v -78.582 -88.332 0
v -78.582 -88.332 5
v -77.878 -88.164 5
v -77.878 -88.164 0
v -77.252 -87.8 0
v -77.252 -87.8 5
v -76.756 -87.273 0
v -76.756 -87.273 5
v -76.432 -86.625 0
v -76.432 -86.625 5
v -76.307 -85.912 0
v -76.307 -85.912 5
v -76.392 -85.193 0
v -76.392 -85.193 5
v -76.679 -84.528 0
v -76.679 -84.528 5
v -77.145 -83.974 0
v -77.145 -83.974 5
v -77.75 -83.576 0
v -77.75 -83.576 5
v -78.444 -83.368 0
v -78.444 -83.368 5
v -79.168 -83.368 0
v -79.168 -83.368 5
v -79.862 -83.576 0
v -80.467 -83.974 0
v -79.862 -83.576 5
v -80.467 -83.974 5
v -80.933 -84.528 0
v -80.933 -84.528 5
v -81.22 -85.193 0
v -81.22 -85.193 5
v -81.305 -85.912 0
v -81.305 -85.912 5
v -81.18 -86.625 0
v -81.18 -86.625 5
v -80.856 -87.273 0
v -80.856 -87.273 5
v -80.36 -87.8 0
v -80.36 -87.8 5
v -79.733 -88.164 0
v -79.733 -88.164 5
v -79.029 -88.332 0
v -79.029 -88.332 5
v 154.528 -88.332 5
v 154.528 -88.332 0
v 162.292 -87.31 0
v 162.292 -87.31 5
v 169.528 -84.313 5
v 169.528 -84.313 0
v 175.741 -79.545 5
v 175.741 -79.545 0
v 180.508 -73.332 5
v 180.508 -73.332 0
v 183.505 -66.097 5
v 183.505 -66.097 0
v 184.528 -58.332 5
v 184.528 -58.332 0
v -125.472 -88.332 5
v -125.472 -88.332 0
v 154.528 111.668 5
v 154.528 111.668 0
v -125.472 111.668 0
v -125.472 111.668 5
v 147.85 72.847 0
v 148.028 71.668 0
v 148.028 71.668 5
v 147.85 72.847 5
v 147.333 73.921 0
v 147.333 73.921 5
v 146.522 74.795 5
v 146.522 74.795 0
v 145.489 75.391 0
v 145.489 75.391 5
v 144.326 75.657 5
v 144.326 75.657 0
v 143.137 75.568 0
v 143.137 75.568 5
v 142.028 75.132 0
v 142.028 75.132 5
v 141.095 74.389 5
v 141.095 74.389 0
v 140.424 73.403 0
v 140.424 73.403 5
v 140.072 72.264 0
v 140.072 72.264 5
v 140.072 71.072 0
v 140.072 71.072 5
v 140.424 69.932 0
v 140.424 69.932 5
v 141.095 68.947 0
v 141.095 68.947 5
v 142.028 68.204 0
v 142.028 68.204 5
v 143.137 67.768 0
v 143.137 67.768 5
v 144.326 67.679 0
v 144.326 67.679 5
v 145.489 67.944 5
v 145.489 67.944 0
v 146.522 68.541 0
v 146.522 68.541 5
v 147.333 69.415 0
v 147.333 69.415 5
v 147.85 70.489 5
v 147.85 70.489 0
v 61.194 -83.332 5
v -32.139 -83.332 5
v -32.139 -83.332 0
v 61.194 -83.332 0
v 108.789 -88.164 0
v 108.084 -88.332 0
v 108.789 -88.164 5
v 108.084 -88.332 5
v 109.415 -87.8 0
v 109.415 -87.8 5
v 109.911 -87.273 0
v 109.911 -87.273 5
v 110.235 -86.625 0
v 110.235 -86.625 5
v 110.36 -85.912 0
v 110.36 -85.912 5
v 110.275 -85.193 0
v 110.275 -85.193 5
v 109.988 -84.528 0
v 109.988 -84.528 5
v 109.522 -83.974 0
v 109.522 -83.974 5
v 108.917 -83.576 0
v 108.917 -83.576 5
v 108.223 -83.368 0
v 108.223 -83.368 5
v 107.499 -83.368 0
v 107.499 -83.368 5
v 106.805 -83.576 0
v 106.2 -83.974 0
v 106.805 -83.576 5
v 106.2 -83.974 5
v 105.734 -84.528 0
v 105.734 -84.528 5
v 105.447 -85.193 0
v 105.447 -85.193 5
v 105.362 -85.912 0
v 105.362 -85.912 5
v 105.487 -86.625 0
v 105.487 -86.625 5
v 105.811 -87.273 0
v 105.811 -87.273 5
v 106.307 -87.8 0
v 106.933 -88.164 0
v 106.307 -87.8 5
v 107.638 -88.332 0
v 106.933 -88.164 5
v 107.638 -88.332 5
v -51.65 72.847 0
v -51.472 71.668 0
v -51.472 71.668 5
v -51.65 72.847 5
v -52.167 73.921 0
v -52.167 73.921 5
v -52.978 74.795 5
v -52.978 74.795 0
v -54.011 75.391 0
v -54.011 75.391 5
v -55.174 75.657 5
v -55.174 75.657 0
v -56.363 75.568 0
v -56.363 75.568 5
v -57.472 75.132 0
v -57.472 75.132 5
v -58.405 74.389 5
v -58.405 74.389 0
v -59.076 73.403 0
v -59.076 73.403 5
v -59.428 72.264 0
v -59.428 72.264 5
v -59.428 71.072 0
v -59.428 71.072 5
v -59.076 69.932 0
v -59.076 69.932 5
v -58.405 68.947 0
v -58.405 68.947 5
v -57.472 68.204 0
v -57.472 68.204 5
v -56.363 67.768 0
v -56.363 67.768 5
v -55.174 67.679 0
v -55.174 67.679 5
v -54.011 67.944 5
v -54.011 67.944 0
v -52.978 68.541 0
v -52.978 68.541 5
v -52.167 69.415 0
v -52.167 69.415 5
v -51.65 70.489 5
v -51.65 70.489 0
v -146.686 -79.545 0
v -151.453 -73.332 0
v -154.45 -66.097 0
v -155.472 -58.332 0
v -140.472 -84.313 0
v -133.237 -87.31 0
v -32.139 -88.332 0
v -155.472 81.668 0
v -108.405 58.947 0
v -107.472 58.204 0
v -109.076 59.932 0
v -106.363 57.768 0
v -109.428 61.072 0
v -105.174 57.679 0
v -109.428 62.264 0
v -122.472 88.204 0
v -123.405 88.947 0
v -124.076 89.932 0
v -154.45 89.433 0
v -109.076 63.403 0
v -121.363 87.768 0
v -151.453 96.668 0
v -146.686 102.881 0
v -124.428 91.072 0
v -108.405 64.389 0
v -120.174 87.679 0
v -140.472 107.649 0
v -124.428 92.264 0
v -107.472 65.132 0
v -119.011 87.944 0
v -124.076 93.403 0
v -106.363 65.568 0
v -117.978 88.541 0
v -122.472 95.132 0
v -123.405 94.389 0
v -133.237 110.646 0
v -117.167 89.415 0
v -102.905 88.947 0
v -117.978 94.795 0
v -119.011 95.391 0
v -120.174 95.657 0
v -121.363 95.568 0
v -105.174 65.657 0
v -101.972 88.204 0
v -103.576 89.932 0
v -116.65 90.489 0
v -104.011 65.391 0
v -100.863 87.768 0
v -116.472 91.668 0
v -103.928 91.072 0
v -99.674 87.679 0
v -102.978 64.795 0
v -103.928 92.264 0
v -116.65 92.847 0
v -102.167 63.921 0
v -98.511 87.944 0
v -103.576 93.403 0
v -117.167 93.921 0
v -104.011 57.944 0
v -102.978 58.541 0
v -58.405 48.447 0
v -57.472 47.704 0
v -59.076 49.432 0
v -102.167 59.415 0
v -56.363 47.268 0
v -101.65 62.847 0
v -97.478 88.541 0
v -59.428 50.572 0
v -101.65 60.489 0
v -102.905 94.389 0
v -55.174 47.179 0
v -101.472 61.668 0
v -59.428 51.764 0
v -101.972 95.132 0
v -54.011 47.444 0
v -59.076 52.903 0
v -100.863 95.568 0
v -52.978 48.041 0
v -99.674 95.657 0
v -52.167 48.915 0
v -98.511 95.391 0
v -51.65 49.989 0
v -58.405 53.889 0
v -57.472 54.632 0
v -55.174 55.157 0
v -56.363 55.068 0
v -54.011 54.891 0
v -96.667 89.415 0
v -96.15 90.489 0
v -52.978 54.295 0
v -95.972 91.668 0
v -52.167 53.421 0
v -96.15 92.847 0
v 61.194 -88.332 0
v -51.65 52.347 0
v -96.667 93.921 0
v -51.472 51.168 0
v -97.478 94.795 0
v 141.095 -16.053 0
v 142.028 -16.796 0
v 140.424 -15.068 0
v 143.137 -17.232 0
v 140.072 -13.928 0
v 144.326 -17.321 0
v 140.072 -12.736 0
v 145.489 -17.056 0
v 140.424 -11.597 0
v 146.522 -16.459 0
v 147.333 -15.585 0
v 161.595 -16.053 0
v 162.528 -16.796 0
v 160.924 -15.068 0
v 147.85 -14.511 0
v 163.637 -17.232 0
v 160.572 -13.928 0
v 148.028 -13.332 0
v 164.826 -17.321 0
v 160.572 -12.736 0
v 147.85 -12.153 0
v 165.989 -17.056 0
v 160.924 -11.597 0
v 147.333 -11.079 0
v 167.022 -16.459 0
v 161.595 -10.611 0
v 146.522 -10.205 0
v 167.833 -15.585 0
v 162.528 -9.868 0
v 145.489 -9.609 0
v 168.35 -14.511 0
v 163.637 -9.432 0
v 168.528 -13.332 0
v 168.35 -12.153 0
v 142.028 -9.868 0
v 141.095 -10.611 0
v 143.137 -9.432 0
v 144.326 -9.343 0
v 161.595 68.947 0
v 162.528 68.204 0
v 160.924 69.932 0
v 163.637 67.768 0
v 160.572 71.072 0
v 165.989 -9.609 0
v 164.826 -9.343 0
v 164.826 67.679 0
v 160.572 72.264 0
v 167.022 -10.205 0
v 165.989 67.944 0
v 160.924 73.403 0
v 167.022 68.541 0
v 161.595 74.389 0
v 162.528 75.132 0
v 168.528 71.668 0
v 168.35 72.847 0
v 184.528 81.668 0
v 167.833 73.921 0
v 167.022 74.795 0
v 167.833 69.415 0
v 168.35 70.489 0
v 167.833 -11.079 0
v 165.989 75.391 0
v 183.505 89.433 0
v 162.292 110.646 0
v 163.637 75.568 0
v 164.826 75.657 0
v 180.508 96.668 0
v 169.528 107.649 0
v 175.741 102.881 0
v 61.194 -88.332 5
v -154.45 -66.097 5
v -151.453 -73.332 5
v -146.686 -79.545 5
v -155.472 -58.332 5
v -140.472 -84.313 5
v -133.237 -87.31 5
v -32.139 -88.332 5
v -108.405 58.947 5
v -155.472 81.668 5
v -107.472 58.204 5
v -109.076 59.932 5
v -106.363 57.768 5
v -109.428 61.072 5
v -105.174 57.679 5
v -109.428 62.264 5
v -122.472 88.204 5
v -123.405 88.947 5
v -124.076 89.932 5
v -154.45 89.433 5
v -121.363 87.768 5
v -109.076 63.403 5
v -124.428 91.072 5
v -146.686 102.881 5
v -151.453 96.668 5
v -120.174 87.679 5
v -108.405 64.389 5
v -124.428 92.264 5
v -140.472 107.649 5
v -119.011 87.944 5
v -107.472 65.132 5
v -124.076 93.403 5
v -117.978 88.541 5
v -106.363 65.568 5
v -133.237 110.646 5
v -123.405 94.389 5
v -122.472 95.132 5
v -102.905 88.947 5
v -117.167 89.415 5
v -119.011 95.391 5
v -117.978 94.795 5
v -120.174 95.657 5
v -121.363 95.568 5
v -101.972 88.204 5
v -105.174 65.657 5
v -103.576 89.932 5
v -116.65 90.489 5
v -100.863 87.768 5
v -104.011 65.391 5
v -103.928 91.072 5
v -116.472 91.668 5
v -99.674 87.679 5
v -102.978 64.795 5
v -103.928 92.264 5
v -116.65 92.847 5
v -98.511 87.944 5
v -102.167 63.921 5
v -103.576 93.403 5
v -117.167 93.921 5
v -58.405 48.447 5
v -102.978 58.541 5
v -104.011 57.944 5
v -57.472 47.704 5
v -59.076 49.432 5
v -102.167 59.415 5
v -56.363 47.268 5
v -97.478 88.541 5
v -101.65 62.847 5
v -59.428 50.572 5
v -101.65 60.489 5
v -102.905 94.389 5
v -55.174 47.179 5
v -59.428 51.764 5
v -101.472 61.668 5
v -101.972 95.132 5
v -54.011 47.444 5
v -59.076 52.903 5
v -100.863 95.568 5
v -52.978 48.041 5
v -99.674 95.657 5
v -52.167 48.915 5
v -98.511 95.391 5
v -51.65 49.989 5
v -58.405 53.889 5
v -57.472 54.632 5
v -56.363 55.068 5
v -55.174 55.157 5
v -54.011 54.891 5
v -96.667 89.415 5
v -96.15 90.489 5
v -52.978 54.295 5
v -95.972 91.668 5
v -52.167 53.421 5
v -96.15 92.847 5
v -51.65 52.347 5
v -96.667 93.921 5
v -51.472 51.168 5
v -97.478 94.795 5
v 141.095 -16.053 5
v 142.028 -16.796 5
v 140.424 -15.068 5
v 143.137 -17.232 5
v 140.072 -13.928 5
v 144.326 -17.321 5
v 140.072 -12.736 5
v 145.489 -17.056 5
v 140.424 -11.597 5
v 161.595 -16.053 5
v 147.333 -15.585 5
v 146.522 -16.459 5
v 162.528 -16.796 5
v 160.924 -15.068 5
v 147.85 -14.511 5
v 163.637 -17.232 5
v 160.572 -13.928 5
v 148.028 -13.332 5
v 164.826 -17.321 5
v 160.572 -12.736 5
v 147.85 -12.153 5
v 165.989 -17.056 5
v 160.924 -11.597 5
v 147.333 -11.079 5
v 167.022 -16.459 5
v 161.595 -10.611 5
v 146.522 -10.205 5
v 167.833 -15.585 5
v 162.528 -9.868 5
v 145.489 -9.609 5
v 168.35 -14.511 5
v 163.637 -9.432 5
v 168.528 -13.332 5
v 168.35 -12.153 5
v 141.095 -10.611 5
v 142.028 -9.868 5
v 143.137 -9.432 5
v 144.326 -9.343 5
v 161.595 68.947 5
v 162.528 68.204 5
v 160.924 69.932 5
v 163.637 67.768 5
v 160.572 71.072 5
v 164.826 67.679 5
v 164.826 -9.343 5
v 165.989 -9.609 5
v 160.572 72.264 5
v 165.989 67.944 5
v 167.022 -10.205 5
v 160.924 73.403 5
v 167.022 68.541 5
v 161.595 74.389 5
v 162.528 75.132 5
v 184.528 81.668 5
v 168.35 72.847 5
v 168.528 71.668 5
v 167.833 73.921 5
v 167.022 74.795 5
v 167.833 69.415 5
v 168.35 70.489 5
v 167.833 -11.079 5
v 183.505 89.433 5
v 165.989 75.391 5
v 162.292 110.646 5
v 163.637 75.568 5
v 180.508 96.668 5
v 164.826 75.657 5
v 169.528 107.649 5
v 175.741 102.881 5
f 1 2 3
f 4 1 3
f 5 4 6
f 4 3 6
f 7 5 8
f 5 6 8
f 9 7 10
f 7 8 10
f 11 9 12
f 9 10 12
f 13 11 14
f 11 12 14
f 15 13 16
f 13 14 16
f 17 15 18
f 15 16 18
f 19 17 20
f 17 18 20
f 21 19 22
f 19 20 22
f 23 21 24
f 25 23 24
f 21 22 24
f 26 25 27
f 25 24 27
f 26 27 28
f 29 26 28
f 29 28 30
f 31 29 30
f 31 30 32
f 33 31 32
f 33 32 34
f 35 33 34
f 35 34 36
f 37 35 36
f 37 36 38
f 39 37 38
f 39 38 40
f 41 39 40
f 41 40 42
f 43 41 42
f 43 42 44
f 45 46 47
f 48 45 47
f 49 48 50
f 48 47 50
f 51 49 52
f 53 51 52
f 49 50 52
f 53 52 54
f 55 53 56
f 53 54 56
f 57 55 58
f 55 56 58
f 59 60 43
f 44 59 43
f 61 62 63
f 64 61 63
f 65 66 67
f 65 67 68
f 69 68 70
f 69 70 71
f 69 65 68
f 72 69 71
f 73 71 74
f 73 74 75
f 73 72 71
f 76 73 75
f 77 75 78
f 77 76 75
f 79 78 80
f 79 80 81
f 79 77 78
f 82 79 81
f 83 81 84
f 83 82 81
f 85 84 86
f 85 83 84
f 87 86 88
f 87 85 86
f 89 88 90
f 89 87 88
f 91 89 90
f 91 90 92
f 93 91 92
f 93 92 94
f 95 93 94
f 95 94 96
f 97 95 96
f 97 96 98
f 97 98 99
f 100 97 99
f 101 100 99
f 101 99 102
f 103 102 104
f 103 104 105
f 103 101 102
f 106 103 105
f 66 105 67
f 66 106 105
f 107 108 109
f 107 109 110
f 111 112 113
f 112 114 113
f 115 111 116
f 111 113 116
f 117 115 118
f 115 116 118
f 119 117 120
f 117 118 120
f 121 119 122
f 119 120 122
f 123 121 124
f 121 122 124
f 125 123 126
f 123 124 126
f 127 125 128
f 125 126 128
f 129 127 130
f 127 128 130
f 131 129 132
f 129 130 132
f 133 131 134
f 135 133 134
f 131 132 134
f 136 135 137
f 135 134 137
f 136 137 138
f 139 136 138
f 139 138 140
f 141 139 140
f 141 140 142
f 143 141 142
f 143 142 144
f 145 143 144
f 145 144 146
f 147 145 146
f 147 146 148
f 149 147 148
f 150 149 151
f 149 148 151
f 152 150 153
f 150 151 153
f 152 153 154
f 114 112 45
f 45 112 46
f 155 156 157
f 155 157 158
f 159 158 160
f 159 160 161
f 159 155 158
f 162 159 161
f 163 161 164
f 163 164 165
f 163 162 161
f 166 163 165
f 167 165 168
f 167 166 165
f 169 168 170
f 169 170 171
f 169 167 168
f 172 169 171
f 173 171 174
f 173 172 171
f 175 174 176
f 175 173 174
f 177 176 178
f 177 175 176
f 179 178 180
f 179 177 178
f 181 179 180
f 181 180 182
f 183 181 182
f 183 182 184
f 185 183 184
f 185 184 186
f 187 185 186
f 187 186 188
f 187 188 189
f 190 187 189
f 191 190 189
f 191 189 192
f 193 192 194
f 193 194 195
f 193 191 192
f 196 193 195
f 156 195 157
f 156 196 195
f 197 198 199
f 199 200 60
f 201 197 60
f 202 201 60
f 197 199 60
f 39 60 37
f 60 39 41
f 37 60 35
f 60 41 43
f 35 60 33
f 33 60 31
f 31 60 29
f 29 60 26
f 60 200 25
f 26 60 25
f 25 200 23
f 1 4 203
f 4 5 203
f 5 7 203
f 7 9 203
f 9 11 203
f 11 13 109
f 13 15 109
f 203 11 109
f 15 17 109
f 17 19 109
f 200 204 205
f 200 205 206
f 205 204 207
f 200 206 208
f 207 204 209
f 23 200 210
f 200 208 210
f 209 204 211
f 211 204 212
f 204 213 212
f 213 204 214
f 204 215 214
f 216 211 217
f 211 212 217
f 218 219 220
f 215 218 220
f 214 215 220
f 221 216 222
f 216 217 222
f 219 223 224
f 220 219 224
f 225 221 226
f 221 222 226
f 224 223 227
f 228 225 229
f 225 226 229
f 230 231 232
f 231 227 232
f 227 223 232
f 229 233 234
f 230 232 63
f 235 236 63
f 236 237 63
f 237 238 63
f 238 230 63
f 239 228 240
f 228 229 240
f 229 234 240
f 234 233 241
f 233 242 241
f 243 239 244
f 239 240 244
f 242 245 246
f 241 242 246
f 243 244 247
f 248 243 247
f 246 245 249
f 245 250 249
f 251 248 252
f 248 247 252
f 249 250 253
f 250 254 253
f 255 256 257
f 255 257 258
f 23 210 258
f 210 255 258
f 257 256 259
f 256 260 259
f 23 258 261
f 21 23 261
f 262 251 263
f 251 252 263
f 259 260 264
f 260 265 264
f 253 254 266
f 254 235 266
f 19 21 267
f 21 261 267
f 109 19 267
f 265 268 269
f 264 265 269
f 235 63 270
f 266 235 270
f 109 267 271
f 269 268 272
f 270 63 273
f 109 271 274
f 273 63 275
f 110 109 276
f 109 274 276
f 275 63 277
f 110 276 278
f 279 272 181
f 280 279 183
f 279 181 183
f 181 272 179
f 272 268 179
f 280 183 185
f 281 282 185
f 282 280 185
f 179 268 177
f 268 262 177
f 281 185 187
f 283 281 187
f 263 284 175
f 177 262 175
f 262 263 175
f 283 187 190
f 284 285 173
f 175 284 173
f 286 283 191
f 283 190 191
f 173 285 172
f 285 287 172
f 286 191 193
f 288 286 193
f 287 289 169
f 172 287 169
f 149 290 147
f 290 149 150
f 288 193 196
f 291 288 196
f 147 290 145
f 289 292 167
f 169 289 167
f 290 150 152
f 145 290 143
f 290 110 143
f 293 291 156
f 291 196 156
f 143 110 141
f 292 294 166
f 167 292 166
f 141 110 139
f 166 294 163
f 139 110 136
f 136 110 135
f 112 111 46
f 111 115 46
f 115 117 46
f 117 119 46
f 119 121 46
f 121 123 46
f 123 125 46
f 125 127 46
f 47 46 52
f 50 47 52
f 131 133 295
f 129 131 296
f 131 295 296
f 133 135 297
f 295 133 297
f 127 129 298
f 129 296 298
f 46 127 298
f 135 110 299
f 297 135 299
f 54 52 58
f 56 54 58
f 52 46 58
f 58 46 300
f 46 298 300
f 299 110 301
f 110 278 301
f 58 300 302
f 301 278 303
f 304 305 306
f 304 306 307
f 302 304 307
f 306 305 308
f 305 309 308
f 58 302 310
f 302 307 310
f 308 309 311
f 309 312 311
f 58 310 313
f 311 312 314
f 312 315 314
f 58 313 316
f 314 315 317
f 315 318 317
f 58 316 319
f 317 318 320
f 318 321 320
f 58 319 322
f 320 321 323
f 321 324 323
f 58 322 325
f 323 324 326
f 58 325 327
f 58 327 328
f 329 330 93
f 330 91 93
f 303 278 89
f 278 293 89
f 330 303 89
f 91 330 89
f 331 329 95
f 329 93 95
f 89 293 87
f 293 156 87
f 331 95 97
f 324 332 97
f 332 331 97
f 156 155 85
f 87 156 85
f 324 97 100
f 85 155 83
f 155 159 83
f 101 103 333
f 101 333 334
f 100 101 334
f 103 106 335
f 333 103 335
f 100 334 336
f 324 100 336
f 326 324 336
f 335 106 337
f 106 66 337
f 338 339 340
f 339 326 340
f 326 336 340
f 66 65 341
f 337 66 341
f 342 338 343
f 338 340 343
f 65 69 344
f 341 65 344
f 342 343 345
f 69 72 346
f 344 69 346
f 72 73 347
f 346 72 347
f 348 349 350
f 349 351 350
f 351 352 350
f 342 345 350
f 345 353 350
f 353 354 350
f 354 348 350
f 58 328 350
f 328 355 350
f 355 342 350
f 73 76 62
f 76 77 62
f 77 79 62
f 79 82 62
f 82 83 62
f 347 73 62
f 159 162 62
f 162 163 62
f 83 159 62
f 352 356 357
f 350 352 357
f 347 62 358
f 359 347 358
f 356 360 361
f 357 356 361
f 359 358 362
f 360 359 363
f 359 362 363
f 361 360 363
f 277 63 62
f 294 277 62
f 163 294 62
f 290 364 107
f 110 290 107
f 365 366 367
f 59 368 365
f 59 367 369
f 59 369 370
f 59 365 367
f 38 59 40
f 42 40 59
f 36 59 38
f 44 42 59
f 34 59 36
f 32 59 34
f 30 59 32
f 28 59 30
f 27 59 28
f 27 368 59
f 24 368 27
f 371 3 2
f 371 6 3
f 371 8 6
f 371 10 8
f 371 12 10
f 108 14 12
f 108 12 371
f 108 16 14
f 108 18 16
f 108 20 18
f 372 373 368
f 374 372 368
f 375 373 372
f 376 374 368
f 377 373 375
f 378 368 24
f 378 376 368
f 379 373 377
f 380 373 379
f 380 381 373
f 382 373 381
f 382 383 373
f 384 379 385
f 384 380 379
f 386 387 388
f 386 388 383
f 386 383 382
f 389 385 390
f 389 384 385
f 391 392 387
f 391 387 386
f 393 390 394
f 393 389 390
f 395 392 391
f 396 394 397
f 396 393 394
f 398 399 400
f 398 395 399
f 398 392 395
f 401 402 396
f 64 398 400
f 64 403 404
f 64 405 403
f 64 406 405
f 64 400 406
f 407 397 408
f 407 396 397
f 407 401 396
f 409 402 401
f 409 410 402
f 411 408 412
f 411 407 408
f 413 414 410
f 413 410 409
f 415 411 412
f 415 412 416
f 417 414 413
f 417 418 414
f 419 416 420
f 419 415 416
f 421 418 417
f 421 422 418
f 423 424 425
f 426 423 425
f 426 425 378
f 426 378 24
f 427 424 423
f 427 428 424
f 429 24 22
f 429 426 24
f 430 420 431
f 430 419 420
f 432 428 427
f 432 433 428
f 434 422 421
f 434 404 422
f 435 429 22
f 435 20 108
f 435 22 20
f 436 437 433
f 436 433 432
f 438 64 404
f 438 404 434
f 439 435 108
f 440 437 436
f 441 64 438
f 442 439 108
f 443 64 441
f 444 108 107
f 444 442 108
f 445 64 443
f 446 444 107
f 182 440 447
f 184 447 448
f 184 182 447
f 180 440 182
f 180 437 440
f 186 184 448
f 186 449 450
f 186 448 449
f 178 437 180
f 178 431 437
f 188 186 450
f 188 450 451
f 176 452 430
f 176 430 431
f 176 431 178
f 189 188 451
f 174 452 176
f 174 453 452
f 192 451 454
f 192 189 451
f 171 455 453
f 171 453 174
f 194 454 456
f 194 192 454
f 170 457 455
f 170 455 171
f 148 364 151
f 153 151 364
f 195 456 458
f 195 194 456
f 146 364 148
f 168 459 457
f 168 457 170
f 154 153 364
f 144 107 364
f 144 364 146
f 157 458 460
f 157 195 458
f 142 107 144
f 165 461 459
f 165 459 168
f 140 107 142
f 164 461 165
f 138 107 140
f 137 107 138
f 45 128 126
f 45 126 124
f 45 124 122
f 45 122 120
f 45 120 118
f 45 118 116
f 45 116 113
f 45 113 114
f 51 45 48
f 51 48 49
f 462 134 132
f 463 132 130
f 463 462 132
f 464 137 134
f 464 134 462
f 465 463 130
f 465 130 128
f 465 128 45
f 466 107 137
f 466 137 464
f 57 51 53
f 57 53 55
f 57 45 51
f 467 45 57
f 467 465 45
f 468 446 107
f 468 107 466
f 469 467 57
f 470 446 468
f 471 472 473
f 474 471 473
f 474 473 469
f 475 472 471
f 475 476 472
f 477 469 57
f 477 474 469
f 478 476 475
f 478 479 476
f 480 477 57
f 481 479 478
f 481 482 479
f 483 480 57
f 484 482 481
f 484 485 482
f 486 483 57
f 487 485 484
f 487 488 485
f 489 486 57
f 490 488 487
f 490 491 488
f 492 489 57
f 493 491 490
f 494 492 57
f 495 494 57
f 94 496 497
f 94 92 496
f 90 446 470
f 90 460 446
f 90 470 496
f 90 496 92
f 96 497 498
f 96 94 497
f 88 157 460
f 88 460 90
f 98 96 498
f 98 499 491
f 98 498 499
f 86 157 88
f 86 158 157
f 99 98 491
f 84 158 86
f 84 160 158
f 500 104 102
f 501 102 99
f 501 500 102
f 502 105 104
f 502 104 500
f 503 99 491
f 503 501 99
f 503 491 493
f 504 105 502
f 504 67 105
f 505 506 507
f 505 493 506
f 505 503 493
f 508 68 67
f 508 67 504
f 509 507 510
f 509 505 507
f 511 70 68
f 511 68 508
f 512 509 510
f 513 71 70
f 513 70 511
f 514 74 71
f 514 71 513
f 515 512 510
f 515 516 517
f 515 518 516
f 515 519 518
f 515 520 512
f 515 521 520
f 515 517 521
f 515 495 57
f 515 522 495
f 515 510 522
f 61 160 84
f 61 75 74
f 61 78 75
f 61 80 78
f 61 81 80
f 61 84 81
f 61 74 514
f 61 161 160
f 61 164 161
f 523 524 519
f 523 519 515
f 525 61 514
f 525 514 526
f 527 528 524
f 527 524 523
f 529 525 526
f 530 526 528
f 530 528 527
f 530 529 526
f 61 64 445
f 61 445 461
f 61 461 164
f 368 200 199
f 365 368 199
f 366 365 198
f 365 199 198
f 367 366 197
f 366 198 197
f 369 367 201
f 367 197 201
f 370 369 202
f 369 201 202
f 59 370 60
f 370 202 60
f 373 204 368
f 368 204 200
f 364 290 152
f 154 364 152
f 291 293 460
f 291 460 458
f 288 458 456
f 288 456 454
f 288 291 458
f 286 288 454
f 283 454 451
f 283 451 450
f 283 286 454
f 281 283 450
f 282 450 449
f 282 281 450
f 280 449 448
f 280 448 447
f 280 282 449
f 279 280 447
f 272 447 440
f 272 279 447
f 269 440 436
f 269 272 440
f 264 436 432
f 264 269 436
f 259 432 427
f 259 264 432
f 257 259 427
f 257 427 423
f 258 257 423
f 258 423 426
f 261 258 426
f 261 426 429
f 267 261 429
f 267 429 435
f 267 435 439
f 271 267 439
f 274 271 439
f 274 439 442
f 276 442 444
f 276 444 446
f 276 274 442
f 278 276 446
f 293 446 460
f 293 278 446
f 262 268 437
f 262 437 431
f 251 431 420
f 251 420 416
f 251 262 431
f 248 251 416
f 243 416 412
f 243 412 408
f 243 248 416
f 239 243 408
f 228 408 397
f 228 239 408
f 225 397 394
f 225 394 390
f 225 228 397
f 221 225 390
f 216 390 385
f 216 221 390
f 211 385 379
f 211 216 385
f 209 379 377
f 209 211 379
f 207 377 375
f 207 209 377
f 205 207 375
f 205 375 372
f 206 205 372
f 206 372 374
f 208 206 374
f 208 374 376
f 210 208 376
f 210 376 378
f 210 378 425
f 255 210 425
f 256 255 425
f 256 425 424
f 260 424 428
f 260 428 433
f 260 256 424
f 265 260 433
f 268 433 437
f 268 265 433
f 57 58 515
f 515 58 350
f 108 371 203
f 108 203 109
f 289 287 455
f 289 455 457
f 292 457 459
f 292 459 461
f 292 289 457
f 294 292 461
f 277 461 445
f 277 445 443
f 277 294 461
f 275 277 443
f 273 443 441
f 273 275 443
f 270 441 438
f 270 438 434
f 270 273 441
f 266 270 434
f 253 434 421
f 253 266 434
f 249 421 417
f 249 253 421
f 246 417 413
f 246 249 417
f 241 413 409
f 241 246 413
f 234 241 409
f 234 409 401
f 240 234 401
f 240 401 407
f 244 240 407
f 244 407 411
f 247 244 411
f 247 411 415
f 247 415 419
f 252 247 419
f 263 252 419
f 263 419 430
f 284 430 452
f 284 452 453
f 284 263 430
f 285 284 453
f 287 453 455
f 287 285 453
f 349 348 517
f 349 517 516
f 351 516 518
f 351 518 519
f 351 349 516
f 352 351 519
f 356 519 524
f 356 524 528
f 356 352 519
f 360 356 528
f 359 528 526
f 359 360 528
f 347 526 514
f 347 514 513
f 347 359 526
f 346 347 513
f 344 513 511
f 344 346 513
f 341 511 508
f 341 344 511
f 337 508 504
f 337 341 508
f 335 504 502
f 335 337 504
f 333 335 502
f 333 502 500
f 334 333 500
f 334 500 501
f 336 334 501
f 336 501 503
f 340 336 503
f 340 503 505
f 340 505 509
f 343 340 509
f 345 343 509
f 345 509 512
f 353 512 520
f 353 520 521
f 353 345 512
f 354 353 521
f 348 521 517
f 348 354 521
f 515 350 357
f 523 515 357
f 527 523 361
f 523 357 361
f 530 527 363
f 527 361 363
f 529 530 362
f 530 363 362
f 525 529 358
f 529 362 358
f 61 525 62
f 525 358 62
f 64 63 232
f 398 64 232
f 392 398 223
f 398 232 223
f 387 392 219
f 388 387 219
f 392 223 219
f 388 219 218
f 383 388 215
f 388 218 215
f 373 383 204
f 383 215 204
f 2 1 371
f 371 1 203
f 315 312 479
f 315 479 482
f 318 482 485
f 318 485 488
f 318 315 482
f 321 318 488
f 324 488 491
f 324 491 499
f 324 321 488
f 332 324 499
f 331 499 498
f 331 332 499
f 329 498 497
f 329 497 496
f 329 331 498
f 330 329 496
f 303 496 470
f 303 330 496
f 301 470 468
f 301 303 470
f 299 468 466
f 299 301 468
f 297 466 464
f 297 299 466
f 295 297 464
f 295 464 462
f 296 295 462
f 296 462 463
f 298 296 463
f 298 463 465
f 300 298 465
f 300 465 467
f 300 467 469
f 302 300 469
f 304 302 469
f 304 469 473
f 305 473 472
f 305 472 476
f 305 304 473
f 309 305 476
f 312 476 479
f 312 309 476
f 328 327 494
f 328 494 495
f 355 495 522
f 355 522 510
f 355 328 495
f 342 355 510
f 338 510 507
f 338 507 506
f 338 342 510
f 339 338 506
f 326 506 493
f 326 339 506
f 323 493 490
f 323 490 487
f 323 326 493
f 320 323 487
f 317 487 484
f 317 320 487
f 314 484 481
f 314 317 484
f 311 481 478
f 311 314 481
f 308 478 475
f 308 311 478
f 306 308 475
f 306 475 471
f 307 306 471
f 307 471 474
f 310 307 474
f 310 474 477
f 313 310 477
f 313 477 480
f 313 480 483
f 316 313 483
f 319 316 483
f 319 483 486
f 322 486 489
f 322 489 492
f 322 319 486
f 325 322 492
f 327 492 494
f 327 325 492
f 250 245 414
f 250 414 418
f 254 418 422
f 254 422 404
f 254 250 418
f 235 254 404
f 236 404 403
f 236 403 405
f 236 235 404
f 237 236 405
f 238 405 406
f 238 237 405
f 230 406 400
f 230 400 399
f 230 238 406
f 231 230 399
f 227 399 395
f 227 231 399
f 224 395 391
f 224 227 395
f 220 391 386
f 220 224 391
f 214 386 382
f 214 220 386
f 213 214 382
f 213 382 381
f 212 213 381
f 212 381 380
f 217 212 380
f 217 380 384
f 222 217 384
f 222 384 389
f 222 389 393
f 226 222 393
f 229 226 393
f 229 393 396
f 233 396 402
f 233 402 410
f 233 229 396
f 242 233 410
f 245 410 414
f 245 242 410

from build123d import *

# Parameters (mm, degrees)
CROQUIS1_R              = 4
SALIENTE_EXTRUIR1_DEPTH = 5
CROQUIS3_W              = 93.333333333
CROQUIS3_H              = 5
CORTAR_EXTRUIR1_DEPTH   = 10
CROQUIS6_R              = 2.5
CORTAR_EXTRUIR2_DEPTH   = 10


with BuildPart() as part:
    # Croquis1 → Saliente-Extruir1 (new body)
    with BuildSketch(Plane.XY):
        with BuildLine():
            Line((-125.472429705, -88.332065653), (154.527570295, -88.332065653))
            ThreePointArc((154.527570295, -88.332065653), (175.740773731, -79.545269088), (184.527570295, -58.332065653))
            Line((184.527570295, -58.332065653), (184.527570295, 81.667934347))
            ThreePointArc((184.527570295, 81.667934347), (175.740773731, 102.881137783), (154.527570295, 111.667934347))
            Line((154.527570295, 111.667934347), (-125.472429705, 111.667934347))
            ThreePointArc((-125.472429705, 111.667934347), (-146.68563314, 102.881137783), (-155.472429705, 81.667934347))
            Line((-155.472429705, 81.667934347), (-155.472429705, -58.332065653))
            ThreePointArc((-155.472429705, -58.332065653), (-146.68563314, -79.545269088), (-125.472429705, -88.332065653))
        make_face()
        with Locations((-105.472429705, 61.667934347)):
            Circle(CROQUIS1_R, mode=Mode.SUBTRACT)
        with Locations((-55.472429705, 71.667934347)):
            Circle(CROQUIS1_R, mode=Mode.SUBTRACT)
        with Locations((-55.472429705, 51.167934347)):
            Circle(CROQUIS1_R, mode=Mode.SUBTRACT)
        with Locations((144.027570295, -13.332065653)):
            Circle(CROQUIS1_R, mode=Mode.SUBTRACT)
        with Locations((164.527570295, -13.332065653)):
            Circle(CROQUIS1_R, mode=Mode.SUBTRACT)
        with Locations((144.027570295, 71.667934347)):
            Circle(CROQUIS1_R, mode=Mode.SUBTRACT)
        with Locations((164.527570295, 71.667934347)):
            Circle(CROQUIS1_R, mode=Mode.SUBTRACT)
        with Locations((-99.972429705, 91.667934347)):
            Circle(CROQUIS1_R, mode=Mode.SUBTRACT)
        with Locations((-120.472429705, 91.667934347)):
            Circle(CROQUIS1_R, mode=Mode.SUBTRACT)
    extrude(amount=SALIENTE_EXTRUIR1_DEPTH)

    # Croquis3 → Cortar-Extruir1 (cut)
    with BuildSketch(Plane.XY.offset(5)):
        with Locations((14.527570296, -85.832065653)):
            Rectangle(CROQUIS3_W, CROQUIS3_H)
    extrude(amount=-CORTAR_EXTRUIR1_DEPTH, mode=Mode.SUBTRACT)

    # Croquis6 → Cortar-Extruir2 (cut)
    with BuildSketch(Plane.XY.offset(5)):
        with Locations((-78.805763038, -85.842065653)):
            Circle(CROQUIS6_R)
        with Locations((107.860903629, -85.842065653)):
            Circle(CROQUIS6_R)
    extrude(amount=-CORTAR_EXTRUIR2_DEPTH, mode=Mode.SUBTRACT)


solid = part.part
